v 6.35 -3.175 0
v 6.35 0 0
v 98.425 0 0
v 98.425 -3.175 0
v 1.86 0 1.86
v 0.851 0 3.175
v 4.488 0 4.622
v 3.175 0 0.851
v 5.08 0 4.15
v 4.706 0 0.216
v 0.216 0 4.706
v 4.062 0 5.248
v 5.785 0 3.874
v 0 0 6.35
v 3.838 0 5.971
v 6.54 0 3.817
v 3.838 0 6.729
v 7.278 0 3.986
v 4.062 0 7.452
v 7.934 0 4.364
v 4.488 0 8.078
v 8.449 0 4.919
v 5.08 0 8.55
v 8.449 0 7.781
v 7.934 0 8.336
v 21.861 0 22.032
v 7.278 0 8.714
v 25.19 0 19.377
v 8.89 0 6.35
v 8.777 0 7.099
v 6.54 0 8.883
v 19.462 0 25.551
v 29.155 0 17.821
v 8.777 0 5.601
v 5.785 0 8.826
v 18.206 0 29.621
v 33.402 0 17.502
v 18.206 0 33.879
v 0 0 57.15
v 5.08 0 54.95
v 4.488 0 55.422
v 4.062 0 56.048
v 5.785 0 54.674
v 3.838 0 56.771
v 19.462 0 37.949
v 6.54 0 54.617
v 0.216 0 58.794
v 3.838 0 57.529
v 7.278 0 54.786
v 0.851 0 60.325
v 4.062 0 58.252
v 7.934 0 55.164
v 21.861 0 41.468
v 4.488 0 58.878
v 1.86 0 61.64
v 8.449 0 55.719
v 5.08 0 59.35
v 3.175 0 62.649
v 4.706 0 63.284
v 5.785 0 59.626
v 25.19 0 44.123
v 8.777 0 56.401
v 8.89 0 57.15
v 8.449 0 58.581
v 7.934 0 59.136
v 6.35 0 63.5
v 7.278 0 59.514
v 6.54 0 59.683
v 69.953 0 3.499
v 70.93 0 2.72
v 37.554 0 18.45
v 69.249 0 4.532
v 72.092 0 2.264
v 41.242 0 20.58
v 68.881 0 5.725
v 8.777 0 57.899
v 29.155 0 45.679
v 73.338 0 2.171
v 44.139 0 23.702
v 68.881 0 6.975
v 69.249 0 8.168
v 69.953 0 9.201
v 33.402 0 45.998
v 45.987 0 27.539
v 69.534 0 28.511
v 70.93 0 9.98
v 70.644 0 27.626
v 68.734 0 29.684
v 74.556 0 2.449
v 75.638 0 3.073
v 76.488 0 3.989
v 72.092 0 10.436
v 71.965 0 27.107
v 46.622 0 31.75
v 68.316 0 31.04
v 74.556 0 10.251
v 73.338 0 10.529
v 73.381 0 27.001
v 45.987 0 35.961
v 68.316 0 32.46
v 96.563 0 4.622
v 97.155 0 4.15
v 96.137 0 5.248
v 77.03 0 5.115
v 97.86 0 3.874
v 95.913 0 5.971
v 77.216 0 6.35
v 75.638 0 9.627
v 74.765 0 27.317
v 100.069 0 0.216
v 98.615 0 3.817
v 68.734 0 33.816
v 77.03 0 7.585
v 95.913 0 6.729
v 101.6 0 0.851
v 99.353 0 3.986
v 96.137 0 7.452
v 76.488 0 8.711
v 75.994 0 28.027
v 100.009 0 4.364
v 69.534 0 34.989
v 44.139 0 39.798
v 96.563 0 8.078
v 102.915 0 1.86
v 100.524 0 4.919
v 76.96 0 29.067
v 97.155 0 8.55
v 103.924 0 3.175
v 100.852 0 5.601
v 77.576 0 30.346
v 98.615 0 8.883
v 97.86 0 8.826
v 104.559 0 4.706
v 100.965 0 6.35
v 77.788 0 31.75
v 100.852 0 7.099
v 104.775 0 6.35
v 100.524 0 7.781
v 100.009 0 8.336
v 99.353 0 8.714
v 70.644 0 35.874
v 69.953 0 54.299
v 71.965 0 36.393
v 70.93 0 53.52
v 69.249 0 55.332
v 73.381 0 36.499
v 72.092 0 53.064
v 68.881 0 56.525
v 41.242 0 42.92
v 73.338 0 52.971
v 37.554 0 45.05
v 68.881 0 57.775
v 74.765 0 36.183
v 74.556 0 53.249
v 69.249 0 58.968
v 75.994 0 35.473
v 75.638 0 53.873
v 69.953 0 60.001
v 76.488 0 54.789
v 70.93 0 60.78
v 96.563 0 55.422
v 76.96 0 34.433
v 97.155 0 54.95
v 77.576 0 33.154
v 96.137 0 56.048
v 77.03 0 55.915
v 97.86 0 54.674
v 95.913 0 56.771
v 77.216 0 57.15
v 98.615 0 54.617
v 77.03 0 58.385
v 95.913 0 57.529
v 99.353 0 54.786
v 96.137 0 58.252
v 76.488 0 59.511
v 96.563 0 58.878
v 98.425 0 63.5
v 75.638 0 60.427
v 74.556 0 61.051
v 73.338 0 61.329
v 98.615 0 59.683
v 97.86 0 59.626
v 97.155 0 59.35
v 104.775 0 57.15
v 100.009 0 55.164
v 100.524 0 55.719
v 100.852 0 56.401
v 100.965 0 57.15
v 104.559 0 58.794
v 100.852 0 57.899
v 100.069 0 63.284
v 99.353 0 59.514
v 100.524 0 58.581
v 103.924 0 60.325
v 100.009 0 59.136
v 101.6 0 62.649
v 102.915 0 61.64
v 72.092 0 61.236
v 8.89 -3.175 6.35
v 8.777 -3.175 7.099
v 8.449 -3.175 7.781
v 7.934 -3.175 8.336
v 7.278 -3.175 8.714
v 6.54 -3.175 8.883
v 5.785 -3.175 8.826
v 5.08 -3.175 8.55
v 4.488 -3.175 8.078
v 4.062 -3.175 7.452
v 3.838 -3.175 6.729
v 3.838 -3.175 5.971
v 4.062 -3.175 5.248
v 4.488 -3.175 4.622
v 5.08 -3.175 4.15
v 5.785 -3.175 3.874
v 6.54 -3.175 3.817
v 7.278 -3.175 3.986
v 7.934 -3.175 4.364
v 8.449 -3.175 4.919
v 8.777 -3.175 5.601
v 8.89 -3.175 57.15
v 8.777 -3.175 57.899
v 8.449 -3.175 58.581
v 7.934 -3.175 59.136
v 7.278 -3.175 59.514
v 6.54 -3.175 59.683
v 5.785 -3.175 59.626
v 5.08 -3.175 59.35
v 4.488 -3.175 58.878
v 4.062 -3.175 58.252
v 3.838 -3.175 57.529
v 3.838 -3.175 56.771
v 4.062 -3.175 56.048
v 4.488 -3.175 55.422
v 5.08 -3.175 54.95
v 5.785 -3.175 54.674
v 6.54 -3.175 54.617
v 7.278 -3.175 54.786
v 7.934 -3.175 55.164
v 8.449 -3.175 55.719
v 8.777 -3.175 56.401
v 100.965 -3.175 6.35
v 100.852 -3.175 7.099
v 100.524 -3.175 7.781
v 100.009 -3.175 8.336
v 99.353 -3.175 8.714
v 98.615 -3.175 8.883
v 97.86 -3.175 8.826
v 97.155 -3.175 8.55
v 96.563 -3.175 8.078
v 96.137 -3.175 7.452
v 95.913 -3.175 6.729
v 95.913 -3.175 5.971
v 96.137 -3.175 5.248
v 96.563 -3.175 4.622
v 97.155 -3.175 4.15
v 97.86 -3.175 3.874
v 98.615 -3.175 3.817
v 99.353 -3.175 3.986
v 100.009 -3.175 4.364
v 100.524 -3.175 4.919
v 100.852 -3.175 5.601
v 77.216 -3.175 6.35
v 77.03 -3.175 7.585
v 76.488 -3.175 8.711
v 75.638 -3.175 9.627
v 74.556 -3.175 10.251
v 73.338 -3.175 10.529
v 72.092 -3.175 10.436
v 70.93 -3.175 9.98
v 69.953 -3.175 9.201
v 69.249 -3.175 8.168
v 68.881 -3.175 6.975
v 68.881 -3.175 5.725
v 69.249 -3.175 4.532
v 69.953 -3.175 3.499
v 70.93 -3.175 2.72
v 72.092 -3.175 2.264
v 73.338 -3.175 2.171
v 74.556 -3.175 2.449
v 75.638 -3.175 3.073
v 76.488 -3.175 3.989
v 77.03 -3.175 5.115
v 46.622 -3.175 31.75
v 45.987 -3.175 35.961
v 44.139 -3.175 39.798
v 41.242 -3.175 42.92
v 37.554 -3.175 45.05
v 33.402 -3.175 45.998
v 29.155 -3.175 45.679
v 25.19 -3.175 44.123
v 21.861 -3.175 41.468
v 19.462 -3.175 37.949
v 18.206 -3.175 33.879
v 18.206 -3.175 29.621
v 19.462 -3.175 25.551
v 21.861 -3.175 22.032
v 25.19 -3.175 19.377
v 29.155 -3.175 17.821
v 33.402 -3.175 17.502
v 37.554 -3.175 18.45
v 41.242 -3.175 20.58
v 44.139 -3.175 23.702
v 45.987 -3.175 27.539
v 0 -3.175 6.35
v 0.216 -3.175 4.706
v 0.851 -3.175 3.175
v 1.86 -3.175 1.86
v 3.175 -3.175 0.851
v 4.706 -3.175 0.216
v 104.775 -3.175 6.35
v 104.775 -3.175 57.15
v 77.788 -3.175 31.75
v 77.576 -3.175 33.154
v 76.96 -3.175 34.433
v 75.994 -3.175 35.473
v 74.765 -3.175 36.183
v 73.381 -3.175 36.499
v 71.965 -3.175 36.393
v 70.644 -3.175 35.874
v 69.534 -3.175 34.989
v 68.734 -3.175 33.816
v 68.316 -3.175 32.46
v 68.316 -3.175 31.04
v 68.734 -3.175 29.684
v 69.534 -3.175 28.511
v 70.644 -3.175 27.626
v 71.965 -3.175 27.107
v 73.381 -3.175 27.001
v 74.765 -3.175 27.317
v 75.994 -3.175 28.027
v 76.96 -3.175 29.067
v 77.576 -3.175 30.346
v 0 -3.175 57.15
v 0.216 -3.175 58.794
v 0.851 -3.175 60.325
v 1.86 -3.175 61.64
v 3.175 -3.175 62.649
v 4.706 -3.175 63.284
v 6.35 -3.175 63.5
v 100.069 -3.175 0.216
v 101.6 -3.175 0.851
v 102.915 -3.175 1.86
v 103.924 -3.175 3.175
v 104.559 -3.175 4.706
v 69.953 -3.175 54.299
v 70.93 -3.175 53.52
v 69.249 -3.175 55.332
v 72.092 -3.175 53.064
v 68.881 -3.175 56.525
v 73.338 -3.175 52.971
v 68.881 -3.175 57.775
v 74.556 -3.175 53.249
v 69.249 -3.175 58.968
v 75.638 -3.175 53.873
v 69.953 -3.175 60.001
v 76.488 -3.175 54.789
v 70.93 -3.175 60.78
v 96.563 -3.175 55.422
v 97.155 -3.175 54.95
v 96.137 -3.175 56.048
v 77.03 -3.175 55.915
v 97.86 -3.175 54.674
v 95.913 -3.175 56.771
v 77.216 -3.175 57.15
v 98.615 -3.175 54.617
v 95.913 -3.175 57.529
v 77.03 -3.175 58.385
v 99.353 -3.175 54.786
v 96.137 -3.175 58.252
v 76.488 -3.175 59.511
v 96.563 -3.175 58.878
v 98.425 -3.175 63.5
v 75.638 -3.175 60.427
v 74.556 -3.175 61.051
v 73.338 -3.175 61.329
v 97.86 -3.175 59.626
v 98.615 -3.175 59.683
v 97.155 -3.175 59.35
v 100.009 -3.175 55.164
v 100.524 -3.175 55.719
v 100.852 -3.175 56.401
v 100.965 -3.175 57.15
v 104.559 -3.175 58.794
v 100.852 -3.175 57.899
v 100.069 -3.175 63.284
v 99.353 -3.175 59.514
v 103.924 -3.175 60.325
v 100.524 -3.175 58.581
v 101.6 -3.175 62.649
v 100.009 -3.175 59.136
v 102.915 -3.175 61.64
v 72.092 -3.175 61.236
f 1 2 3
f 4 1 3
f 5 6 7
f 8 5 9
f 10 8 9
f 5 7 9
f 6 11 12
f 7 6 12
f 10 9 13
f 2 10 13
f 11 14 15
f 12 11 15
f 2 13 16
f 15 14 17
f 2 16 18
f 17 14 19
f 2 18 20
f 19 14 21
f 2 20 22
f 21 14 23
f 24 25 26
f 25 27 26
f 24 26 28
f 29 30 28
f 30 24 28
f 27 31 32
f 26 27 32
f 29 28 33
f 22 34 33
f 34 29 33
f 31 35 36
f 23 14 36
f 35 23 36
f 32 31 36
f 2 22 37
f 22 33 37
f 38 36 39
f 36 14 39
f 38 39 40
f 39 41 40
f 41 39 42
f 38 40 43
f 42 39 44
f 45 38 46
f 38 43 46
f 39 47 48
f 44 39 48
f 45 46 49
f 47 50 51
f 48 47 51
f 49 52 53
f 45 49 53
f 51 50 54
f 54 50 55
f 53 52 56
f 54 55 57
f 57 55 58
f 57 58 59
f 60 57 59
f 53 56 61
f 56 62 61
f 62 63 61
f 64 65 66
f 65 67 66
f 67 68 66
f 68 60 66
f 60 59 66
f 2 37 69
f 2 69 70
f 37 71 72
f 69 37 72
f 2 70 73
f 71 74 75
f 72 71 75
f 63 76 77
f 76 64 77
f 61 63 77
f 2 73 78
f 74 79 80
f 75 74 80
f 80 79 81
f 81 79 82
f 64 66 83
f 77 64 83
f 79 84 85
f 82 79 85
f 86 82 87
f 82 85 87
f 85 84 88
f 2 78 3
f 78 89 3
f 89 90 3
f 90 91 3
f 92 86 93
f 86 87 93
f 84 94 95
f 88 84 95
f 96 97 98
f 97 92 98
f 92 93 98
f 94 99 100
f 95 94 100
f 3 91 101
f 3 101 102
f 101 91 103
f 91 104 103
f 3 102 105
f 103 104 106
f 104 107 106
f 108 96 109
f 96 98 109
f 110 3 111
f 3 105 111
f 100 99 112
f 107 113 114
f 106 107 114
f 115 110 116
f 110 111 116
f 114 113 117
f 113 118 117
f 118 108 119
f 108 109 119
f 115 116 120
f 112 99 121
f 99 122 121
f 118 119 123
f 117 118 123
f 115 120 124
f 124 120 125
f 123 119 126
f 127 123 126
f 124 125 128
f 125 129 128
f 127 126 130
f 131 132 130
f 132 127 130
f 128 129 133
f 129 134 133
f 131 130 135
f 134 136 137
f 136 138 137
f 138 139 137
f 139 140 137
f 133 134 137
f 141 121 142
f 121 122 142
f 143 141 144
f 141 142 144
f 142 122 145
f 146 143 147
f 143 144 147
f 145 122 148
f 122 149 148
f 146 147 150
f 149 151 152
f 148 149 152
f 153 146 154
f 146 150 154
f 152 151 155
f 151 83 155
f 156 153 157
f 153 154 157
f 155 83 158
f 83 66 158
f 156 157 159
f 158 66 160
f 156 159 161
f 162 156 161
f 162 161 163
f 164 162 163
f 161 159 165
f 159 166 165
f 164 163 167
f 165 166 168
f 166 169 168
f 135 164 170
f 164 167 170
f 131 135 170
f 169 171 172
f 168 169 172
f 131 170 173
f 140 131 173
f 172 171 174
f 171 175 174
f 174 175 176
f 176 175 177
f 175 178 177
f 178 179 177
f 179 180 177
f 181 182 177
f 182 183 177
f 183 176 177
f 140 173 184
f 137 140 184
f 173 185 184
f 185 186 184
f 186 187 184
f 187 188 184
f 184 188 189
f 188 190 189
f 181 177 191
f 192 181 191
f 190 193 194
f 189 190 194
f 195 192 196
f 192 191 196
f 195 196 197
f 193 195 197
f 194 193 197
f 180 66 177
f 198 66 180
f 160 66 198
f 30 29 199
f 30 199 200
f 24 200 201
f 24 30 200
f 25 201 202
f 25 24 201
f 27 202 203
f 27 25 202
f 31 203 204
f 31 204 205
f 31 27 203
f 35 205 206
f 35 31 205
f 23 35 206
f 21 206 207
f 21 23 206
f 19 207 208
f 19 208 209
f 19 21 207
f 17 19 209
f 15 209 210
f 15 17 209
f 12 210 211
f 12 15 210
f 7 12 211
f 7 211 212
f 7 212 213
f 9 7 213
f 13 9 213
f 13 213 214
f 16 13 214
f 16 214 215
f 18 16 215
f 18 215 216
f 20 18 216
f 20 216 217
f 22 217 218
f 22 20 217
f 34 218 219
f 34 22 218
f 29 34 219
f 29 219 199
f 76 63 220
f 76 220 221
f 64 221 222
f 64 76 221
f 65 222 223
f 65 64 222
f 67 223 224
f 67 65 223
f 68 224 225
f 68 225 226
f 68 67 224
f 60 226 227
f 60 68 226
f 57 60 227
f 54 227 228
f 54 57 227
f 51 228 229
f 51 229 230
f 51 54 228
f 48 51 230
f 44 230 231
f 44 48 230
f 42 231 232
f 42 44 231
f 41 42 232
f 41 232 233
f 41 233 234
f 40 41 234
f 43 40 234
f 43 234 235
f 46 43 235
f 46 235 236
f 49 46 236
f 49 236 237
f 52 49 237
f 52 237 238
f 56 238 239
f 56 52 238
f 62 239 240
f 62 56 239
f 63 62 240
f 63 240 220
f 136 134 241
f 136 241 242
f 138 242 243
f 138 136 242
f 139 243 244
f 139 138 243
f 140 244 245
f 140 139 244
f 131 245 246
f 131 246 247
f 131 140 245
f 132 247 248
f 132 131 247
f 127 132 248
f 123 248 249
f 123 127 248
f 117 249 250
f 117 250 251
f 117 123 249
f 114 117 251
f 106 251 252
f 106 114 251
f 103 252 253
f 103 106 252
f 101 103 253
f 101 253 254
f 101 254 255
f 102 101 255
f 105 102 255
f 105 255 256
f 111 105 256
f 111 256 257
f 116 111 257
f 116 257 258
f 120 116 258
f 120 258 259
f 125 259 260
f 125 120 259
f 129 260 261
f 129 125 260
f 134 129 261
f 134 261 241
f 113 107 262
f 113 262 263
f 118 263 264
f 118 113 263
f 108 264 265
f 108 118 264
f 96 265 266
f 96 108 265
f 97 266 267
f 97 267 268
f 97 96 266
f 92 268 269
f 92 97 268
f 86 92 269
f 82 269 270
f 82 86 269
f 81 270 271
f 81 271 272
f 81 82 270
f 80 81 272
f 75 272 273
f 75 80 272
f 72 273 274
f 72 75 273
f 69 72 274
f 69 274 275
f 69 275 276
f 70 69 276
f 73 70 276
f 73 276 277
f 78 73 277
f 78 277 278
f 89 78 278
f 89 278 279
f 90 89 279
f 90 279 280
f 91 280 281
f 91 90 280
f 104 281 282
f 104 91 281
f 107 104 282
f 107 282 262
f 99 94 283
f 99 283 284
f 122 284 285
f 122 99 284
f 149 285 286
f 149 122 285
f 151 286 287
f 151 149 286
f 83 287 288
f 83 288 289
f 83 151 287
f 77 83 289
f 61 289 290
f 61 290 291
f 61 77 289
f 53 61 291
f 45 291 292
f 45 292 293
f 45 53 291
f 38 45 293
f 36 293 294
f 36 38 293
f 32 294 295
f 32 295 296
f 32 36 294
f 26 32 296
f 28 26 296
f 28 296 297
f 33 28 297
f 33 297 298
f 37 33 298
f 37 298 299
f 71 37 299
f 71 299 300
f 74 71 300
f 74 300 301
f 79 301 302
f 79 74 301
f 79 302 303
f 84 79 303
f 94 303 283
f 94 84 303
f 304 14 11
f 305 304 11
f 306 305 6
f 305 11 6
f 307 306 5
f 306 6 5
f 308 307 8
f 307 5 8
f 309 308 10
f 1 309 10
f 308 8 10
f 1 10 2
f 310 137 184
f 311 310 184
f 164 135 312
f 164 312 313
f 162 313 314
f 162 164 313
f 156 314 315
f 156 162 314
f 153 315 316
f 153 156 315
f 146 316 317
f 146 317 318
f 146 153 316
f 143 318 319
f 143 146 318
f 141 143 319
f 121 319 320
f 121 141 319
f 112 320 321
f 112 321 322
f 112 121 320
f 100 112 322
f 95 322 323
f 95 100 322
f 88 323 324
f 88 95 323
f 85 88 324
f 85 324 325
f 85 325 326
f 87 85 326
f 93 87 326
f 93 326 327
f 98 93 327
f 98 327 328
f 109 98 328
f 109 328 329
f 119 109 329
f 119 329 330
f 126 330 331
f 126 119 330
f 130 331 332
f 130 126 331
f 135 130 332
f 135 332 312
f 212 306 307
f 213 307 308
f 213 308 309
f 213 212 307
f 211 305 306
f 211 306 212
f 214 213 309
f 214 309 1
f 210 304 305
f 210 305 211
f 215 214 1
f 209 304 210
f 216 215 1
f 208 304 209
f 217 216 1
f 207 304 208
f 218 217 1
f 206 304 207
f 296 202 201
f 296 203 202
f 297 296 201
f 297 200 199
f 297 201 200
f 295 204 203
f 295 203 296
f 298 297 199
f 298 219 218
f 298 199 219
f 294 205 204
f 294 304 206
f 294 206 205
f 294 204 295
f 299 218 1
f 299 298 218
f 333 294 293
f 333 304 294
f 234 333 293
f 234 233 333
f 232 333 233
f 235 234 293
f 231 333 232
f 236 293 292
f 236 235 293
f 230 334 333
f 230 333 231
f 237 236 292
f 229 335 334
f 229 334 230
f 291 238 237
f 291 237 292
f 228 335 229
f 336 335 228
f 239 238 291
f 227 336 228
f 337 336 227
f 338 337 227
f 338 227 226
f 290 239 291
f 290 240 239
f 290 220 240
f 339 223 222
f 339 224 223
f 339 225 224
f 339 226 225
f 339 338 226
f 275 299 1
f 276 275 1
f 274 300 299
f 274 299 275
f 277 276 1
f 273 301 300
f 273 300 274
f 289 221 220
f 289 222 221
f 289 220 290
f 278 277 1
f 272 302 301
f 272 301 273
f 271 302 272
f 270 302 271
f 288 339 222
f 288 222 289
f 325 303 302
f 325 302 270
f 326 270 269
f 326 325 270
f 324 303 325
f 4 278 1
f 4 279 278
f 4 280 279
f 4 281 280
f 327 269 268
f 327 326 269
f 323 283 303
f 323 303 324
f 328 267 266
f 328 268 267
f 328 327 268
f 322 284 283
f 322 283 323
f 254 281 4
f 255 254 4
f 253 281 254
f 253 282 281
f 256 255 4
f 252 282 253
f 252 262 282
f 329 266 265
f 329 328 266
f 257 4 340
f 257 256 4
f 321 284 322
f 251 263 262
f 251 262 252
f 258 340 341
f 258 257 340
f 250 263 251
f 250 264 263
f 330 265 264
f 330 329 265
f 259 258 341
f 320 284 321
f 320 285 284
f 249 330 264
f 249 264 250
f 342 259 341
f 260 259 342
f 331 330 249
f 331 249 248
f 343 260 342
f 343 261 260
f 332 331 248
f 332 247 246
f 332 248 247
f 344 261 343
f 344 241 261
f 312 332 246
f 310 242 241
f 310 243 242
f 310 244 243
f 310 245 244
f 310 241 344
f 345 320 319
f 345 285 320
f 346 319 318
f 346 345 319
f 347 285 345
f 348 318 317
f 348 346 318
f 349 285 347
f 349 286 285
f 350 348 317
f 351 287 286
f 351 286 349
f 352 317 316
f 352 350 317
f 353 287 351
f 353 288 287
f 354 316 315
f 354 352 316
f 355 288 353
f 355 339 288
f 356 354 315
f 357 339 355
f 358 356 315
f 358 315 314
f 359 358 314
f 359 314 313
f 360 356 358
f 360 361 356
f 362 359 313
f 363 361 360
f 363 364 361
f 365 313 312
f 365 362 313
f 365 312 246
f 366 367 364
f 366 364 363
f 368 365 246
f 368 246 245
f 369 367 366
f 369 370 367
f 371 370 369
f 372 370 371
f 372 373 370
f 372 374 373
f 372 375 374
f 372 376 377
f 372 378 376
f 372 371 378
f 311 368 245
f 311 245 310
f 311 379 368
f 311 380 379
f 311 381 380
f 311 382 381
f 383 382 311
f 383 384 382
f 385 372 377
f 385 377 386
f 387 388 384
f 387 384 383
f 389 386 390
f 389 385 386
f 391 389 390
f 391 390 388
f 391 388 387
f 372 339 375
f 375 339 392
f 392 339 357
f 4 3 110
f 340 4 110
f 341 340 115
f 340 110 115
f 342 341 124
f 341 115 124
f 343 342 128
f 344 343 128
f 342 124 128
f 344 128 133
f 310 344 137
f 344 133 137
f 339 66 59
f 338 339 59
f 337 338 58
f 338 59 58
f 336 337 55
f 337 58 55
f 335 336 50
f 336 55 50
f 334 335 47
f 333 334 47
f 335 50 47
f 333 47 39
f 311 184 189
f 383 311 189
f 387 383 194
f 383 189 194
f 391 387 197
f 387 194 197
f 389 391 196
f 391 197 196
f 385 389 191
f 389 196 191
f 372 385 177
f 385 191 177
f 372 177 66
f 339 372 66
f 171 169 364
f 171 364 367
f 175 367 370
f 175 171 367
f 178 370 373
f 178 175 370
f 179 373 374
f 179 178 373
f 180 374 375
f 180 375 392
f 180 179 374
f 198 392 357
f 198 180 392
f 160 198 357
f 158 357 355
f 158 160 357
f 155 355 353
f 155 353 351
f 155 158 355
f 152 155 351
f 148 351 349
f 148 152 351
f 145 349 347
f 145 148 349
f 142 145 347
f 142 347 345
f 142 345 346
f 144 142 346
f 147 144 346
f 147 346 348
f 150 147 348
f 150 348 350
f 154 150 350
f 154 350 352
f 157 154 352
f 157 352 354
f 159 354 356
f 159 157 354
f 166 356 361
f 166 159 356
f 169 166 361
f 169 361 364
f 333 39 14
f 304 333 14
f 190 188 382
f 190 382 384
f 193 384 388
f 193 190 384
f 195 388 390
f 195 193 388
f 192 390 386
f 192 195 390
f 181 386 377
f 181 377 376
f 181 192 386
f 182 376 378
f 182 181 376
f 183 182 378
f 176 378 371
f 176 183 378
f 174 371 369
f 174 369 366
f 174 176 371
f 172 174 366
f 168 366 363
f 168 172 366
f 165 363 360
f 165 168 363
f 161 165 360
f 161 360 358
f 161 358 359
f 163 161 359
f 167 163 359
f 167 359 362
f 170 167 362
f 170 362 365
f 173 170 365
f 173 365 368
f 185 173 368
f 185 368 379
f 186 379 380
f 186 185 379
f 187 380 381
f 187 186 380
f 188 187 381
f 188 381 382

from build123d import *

# Parameters (mm, degrees)
F0_R     = 2.54
F0_R_2   = 4.191
F0_R_3   = 14.2875
F0_R_4   = 4.7625
F1_DEPTH = 3.175


with BuildPart() as f1:
    # F0 (on Front) → F1 (new body)
    with BuildSketch(Plane.XZ):
        with BuildLine():
            ThreePointArc((0, 6.35), (1.859872, 1.859872), (6.35, 0))
            Line((6.35, 0), (98.425, 0))
            ThreePointArc((98.425, 0), (102.915128, 1.859872), (104.775, 6.35))
            Line((104.775, 6.35), (104.775, 57.15))
            ThreePointArc((104.775, 57.15), (102.915128, 61.640128), (98.425, 63.5))
            Line((98.425, 63.5), (6.35, 63.5))
            ThreePointArc((6.35, 63.5), (1.859872, 61.640128), (0, 57.15))
            Line((0, 57.15), (0, 6.35))
        make_face()
        with Locations((6.35, 6.35)):
            Circle(F0_R, mode=Mode.SUBTRACT)
        with Locations((73.025, 6.35)):
            Circle(F0_R_2, mode=Mode.SUBTRACT)
        with Locations((98.425, 6.35)):
            Circle(F0_R, mode=Mode.SUBTRACT)
        with Locations((32.3342, 31.75)):
            Circle(F0_R_3, mode=Mode.SUBTRACT)
        with Locations((6.35, 57.15)):
            Circle(F0_R, mode=Mode.SUBTRACT)
        with Locations((73.025, 31.75)):
            Circle(F0_R_4, mode=Mode.SUBTRACT)
        with Locations((73.025, 57.15)):
            Circle(F0_R_2, mode=Mode.SUBTRACT)
        with Locations((98.425, 57.15)):
            Circle(F0_R, mode=Mode.SUBTRACT)
    extrude(amount=F1_DEPTH)


solid = f1.part
